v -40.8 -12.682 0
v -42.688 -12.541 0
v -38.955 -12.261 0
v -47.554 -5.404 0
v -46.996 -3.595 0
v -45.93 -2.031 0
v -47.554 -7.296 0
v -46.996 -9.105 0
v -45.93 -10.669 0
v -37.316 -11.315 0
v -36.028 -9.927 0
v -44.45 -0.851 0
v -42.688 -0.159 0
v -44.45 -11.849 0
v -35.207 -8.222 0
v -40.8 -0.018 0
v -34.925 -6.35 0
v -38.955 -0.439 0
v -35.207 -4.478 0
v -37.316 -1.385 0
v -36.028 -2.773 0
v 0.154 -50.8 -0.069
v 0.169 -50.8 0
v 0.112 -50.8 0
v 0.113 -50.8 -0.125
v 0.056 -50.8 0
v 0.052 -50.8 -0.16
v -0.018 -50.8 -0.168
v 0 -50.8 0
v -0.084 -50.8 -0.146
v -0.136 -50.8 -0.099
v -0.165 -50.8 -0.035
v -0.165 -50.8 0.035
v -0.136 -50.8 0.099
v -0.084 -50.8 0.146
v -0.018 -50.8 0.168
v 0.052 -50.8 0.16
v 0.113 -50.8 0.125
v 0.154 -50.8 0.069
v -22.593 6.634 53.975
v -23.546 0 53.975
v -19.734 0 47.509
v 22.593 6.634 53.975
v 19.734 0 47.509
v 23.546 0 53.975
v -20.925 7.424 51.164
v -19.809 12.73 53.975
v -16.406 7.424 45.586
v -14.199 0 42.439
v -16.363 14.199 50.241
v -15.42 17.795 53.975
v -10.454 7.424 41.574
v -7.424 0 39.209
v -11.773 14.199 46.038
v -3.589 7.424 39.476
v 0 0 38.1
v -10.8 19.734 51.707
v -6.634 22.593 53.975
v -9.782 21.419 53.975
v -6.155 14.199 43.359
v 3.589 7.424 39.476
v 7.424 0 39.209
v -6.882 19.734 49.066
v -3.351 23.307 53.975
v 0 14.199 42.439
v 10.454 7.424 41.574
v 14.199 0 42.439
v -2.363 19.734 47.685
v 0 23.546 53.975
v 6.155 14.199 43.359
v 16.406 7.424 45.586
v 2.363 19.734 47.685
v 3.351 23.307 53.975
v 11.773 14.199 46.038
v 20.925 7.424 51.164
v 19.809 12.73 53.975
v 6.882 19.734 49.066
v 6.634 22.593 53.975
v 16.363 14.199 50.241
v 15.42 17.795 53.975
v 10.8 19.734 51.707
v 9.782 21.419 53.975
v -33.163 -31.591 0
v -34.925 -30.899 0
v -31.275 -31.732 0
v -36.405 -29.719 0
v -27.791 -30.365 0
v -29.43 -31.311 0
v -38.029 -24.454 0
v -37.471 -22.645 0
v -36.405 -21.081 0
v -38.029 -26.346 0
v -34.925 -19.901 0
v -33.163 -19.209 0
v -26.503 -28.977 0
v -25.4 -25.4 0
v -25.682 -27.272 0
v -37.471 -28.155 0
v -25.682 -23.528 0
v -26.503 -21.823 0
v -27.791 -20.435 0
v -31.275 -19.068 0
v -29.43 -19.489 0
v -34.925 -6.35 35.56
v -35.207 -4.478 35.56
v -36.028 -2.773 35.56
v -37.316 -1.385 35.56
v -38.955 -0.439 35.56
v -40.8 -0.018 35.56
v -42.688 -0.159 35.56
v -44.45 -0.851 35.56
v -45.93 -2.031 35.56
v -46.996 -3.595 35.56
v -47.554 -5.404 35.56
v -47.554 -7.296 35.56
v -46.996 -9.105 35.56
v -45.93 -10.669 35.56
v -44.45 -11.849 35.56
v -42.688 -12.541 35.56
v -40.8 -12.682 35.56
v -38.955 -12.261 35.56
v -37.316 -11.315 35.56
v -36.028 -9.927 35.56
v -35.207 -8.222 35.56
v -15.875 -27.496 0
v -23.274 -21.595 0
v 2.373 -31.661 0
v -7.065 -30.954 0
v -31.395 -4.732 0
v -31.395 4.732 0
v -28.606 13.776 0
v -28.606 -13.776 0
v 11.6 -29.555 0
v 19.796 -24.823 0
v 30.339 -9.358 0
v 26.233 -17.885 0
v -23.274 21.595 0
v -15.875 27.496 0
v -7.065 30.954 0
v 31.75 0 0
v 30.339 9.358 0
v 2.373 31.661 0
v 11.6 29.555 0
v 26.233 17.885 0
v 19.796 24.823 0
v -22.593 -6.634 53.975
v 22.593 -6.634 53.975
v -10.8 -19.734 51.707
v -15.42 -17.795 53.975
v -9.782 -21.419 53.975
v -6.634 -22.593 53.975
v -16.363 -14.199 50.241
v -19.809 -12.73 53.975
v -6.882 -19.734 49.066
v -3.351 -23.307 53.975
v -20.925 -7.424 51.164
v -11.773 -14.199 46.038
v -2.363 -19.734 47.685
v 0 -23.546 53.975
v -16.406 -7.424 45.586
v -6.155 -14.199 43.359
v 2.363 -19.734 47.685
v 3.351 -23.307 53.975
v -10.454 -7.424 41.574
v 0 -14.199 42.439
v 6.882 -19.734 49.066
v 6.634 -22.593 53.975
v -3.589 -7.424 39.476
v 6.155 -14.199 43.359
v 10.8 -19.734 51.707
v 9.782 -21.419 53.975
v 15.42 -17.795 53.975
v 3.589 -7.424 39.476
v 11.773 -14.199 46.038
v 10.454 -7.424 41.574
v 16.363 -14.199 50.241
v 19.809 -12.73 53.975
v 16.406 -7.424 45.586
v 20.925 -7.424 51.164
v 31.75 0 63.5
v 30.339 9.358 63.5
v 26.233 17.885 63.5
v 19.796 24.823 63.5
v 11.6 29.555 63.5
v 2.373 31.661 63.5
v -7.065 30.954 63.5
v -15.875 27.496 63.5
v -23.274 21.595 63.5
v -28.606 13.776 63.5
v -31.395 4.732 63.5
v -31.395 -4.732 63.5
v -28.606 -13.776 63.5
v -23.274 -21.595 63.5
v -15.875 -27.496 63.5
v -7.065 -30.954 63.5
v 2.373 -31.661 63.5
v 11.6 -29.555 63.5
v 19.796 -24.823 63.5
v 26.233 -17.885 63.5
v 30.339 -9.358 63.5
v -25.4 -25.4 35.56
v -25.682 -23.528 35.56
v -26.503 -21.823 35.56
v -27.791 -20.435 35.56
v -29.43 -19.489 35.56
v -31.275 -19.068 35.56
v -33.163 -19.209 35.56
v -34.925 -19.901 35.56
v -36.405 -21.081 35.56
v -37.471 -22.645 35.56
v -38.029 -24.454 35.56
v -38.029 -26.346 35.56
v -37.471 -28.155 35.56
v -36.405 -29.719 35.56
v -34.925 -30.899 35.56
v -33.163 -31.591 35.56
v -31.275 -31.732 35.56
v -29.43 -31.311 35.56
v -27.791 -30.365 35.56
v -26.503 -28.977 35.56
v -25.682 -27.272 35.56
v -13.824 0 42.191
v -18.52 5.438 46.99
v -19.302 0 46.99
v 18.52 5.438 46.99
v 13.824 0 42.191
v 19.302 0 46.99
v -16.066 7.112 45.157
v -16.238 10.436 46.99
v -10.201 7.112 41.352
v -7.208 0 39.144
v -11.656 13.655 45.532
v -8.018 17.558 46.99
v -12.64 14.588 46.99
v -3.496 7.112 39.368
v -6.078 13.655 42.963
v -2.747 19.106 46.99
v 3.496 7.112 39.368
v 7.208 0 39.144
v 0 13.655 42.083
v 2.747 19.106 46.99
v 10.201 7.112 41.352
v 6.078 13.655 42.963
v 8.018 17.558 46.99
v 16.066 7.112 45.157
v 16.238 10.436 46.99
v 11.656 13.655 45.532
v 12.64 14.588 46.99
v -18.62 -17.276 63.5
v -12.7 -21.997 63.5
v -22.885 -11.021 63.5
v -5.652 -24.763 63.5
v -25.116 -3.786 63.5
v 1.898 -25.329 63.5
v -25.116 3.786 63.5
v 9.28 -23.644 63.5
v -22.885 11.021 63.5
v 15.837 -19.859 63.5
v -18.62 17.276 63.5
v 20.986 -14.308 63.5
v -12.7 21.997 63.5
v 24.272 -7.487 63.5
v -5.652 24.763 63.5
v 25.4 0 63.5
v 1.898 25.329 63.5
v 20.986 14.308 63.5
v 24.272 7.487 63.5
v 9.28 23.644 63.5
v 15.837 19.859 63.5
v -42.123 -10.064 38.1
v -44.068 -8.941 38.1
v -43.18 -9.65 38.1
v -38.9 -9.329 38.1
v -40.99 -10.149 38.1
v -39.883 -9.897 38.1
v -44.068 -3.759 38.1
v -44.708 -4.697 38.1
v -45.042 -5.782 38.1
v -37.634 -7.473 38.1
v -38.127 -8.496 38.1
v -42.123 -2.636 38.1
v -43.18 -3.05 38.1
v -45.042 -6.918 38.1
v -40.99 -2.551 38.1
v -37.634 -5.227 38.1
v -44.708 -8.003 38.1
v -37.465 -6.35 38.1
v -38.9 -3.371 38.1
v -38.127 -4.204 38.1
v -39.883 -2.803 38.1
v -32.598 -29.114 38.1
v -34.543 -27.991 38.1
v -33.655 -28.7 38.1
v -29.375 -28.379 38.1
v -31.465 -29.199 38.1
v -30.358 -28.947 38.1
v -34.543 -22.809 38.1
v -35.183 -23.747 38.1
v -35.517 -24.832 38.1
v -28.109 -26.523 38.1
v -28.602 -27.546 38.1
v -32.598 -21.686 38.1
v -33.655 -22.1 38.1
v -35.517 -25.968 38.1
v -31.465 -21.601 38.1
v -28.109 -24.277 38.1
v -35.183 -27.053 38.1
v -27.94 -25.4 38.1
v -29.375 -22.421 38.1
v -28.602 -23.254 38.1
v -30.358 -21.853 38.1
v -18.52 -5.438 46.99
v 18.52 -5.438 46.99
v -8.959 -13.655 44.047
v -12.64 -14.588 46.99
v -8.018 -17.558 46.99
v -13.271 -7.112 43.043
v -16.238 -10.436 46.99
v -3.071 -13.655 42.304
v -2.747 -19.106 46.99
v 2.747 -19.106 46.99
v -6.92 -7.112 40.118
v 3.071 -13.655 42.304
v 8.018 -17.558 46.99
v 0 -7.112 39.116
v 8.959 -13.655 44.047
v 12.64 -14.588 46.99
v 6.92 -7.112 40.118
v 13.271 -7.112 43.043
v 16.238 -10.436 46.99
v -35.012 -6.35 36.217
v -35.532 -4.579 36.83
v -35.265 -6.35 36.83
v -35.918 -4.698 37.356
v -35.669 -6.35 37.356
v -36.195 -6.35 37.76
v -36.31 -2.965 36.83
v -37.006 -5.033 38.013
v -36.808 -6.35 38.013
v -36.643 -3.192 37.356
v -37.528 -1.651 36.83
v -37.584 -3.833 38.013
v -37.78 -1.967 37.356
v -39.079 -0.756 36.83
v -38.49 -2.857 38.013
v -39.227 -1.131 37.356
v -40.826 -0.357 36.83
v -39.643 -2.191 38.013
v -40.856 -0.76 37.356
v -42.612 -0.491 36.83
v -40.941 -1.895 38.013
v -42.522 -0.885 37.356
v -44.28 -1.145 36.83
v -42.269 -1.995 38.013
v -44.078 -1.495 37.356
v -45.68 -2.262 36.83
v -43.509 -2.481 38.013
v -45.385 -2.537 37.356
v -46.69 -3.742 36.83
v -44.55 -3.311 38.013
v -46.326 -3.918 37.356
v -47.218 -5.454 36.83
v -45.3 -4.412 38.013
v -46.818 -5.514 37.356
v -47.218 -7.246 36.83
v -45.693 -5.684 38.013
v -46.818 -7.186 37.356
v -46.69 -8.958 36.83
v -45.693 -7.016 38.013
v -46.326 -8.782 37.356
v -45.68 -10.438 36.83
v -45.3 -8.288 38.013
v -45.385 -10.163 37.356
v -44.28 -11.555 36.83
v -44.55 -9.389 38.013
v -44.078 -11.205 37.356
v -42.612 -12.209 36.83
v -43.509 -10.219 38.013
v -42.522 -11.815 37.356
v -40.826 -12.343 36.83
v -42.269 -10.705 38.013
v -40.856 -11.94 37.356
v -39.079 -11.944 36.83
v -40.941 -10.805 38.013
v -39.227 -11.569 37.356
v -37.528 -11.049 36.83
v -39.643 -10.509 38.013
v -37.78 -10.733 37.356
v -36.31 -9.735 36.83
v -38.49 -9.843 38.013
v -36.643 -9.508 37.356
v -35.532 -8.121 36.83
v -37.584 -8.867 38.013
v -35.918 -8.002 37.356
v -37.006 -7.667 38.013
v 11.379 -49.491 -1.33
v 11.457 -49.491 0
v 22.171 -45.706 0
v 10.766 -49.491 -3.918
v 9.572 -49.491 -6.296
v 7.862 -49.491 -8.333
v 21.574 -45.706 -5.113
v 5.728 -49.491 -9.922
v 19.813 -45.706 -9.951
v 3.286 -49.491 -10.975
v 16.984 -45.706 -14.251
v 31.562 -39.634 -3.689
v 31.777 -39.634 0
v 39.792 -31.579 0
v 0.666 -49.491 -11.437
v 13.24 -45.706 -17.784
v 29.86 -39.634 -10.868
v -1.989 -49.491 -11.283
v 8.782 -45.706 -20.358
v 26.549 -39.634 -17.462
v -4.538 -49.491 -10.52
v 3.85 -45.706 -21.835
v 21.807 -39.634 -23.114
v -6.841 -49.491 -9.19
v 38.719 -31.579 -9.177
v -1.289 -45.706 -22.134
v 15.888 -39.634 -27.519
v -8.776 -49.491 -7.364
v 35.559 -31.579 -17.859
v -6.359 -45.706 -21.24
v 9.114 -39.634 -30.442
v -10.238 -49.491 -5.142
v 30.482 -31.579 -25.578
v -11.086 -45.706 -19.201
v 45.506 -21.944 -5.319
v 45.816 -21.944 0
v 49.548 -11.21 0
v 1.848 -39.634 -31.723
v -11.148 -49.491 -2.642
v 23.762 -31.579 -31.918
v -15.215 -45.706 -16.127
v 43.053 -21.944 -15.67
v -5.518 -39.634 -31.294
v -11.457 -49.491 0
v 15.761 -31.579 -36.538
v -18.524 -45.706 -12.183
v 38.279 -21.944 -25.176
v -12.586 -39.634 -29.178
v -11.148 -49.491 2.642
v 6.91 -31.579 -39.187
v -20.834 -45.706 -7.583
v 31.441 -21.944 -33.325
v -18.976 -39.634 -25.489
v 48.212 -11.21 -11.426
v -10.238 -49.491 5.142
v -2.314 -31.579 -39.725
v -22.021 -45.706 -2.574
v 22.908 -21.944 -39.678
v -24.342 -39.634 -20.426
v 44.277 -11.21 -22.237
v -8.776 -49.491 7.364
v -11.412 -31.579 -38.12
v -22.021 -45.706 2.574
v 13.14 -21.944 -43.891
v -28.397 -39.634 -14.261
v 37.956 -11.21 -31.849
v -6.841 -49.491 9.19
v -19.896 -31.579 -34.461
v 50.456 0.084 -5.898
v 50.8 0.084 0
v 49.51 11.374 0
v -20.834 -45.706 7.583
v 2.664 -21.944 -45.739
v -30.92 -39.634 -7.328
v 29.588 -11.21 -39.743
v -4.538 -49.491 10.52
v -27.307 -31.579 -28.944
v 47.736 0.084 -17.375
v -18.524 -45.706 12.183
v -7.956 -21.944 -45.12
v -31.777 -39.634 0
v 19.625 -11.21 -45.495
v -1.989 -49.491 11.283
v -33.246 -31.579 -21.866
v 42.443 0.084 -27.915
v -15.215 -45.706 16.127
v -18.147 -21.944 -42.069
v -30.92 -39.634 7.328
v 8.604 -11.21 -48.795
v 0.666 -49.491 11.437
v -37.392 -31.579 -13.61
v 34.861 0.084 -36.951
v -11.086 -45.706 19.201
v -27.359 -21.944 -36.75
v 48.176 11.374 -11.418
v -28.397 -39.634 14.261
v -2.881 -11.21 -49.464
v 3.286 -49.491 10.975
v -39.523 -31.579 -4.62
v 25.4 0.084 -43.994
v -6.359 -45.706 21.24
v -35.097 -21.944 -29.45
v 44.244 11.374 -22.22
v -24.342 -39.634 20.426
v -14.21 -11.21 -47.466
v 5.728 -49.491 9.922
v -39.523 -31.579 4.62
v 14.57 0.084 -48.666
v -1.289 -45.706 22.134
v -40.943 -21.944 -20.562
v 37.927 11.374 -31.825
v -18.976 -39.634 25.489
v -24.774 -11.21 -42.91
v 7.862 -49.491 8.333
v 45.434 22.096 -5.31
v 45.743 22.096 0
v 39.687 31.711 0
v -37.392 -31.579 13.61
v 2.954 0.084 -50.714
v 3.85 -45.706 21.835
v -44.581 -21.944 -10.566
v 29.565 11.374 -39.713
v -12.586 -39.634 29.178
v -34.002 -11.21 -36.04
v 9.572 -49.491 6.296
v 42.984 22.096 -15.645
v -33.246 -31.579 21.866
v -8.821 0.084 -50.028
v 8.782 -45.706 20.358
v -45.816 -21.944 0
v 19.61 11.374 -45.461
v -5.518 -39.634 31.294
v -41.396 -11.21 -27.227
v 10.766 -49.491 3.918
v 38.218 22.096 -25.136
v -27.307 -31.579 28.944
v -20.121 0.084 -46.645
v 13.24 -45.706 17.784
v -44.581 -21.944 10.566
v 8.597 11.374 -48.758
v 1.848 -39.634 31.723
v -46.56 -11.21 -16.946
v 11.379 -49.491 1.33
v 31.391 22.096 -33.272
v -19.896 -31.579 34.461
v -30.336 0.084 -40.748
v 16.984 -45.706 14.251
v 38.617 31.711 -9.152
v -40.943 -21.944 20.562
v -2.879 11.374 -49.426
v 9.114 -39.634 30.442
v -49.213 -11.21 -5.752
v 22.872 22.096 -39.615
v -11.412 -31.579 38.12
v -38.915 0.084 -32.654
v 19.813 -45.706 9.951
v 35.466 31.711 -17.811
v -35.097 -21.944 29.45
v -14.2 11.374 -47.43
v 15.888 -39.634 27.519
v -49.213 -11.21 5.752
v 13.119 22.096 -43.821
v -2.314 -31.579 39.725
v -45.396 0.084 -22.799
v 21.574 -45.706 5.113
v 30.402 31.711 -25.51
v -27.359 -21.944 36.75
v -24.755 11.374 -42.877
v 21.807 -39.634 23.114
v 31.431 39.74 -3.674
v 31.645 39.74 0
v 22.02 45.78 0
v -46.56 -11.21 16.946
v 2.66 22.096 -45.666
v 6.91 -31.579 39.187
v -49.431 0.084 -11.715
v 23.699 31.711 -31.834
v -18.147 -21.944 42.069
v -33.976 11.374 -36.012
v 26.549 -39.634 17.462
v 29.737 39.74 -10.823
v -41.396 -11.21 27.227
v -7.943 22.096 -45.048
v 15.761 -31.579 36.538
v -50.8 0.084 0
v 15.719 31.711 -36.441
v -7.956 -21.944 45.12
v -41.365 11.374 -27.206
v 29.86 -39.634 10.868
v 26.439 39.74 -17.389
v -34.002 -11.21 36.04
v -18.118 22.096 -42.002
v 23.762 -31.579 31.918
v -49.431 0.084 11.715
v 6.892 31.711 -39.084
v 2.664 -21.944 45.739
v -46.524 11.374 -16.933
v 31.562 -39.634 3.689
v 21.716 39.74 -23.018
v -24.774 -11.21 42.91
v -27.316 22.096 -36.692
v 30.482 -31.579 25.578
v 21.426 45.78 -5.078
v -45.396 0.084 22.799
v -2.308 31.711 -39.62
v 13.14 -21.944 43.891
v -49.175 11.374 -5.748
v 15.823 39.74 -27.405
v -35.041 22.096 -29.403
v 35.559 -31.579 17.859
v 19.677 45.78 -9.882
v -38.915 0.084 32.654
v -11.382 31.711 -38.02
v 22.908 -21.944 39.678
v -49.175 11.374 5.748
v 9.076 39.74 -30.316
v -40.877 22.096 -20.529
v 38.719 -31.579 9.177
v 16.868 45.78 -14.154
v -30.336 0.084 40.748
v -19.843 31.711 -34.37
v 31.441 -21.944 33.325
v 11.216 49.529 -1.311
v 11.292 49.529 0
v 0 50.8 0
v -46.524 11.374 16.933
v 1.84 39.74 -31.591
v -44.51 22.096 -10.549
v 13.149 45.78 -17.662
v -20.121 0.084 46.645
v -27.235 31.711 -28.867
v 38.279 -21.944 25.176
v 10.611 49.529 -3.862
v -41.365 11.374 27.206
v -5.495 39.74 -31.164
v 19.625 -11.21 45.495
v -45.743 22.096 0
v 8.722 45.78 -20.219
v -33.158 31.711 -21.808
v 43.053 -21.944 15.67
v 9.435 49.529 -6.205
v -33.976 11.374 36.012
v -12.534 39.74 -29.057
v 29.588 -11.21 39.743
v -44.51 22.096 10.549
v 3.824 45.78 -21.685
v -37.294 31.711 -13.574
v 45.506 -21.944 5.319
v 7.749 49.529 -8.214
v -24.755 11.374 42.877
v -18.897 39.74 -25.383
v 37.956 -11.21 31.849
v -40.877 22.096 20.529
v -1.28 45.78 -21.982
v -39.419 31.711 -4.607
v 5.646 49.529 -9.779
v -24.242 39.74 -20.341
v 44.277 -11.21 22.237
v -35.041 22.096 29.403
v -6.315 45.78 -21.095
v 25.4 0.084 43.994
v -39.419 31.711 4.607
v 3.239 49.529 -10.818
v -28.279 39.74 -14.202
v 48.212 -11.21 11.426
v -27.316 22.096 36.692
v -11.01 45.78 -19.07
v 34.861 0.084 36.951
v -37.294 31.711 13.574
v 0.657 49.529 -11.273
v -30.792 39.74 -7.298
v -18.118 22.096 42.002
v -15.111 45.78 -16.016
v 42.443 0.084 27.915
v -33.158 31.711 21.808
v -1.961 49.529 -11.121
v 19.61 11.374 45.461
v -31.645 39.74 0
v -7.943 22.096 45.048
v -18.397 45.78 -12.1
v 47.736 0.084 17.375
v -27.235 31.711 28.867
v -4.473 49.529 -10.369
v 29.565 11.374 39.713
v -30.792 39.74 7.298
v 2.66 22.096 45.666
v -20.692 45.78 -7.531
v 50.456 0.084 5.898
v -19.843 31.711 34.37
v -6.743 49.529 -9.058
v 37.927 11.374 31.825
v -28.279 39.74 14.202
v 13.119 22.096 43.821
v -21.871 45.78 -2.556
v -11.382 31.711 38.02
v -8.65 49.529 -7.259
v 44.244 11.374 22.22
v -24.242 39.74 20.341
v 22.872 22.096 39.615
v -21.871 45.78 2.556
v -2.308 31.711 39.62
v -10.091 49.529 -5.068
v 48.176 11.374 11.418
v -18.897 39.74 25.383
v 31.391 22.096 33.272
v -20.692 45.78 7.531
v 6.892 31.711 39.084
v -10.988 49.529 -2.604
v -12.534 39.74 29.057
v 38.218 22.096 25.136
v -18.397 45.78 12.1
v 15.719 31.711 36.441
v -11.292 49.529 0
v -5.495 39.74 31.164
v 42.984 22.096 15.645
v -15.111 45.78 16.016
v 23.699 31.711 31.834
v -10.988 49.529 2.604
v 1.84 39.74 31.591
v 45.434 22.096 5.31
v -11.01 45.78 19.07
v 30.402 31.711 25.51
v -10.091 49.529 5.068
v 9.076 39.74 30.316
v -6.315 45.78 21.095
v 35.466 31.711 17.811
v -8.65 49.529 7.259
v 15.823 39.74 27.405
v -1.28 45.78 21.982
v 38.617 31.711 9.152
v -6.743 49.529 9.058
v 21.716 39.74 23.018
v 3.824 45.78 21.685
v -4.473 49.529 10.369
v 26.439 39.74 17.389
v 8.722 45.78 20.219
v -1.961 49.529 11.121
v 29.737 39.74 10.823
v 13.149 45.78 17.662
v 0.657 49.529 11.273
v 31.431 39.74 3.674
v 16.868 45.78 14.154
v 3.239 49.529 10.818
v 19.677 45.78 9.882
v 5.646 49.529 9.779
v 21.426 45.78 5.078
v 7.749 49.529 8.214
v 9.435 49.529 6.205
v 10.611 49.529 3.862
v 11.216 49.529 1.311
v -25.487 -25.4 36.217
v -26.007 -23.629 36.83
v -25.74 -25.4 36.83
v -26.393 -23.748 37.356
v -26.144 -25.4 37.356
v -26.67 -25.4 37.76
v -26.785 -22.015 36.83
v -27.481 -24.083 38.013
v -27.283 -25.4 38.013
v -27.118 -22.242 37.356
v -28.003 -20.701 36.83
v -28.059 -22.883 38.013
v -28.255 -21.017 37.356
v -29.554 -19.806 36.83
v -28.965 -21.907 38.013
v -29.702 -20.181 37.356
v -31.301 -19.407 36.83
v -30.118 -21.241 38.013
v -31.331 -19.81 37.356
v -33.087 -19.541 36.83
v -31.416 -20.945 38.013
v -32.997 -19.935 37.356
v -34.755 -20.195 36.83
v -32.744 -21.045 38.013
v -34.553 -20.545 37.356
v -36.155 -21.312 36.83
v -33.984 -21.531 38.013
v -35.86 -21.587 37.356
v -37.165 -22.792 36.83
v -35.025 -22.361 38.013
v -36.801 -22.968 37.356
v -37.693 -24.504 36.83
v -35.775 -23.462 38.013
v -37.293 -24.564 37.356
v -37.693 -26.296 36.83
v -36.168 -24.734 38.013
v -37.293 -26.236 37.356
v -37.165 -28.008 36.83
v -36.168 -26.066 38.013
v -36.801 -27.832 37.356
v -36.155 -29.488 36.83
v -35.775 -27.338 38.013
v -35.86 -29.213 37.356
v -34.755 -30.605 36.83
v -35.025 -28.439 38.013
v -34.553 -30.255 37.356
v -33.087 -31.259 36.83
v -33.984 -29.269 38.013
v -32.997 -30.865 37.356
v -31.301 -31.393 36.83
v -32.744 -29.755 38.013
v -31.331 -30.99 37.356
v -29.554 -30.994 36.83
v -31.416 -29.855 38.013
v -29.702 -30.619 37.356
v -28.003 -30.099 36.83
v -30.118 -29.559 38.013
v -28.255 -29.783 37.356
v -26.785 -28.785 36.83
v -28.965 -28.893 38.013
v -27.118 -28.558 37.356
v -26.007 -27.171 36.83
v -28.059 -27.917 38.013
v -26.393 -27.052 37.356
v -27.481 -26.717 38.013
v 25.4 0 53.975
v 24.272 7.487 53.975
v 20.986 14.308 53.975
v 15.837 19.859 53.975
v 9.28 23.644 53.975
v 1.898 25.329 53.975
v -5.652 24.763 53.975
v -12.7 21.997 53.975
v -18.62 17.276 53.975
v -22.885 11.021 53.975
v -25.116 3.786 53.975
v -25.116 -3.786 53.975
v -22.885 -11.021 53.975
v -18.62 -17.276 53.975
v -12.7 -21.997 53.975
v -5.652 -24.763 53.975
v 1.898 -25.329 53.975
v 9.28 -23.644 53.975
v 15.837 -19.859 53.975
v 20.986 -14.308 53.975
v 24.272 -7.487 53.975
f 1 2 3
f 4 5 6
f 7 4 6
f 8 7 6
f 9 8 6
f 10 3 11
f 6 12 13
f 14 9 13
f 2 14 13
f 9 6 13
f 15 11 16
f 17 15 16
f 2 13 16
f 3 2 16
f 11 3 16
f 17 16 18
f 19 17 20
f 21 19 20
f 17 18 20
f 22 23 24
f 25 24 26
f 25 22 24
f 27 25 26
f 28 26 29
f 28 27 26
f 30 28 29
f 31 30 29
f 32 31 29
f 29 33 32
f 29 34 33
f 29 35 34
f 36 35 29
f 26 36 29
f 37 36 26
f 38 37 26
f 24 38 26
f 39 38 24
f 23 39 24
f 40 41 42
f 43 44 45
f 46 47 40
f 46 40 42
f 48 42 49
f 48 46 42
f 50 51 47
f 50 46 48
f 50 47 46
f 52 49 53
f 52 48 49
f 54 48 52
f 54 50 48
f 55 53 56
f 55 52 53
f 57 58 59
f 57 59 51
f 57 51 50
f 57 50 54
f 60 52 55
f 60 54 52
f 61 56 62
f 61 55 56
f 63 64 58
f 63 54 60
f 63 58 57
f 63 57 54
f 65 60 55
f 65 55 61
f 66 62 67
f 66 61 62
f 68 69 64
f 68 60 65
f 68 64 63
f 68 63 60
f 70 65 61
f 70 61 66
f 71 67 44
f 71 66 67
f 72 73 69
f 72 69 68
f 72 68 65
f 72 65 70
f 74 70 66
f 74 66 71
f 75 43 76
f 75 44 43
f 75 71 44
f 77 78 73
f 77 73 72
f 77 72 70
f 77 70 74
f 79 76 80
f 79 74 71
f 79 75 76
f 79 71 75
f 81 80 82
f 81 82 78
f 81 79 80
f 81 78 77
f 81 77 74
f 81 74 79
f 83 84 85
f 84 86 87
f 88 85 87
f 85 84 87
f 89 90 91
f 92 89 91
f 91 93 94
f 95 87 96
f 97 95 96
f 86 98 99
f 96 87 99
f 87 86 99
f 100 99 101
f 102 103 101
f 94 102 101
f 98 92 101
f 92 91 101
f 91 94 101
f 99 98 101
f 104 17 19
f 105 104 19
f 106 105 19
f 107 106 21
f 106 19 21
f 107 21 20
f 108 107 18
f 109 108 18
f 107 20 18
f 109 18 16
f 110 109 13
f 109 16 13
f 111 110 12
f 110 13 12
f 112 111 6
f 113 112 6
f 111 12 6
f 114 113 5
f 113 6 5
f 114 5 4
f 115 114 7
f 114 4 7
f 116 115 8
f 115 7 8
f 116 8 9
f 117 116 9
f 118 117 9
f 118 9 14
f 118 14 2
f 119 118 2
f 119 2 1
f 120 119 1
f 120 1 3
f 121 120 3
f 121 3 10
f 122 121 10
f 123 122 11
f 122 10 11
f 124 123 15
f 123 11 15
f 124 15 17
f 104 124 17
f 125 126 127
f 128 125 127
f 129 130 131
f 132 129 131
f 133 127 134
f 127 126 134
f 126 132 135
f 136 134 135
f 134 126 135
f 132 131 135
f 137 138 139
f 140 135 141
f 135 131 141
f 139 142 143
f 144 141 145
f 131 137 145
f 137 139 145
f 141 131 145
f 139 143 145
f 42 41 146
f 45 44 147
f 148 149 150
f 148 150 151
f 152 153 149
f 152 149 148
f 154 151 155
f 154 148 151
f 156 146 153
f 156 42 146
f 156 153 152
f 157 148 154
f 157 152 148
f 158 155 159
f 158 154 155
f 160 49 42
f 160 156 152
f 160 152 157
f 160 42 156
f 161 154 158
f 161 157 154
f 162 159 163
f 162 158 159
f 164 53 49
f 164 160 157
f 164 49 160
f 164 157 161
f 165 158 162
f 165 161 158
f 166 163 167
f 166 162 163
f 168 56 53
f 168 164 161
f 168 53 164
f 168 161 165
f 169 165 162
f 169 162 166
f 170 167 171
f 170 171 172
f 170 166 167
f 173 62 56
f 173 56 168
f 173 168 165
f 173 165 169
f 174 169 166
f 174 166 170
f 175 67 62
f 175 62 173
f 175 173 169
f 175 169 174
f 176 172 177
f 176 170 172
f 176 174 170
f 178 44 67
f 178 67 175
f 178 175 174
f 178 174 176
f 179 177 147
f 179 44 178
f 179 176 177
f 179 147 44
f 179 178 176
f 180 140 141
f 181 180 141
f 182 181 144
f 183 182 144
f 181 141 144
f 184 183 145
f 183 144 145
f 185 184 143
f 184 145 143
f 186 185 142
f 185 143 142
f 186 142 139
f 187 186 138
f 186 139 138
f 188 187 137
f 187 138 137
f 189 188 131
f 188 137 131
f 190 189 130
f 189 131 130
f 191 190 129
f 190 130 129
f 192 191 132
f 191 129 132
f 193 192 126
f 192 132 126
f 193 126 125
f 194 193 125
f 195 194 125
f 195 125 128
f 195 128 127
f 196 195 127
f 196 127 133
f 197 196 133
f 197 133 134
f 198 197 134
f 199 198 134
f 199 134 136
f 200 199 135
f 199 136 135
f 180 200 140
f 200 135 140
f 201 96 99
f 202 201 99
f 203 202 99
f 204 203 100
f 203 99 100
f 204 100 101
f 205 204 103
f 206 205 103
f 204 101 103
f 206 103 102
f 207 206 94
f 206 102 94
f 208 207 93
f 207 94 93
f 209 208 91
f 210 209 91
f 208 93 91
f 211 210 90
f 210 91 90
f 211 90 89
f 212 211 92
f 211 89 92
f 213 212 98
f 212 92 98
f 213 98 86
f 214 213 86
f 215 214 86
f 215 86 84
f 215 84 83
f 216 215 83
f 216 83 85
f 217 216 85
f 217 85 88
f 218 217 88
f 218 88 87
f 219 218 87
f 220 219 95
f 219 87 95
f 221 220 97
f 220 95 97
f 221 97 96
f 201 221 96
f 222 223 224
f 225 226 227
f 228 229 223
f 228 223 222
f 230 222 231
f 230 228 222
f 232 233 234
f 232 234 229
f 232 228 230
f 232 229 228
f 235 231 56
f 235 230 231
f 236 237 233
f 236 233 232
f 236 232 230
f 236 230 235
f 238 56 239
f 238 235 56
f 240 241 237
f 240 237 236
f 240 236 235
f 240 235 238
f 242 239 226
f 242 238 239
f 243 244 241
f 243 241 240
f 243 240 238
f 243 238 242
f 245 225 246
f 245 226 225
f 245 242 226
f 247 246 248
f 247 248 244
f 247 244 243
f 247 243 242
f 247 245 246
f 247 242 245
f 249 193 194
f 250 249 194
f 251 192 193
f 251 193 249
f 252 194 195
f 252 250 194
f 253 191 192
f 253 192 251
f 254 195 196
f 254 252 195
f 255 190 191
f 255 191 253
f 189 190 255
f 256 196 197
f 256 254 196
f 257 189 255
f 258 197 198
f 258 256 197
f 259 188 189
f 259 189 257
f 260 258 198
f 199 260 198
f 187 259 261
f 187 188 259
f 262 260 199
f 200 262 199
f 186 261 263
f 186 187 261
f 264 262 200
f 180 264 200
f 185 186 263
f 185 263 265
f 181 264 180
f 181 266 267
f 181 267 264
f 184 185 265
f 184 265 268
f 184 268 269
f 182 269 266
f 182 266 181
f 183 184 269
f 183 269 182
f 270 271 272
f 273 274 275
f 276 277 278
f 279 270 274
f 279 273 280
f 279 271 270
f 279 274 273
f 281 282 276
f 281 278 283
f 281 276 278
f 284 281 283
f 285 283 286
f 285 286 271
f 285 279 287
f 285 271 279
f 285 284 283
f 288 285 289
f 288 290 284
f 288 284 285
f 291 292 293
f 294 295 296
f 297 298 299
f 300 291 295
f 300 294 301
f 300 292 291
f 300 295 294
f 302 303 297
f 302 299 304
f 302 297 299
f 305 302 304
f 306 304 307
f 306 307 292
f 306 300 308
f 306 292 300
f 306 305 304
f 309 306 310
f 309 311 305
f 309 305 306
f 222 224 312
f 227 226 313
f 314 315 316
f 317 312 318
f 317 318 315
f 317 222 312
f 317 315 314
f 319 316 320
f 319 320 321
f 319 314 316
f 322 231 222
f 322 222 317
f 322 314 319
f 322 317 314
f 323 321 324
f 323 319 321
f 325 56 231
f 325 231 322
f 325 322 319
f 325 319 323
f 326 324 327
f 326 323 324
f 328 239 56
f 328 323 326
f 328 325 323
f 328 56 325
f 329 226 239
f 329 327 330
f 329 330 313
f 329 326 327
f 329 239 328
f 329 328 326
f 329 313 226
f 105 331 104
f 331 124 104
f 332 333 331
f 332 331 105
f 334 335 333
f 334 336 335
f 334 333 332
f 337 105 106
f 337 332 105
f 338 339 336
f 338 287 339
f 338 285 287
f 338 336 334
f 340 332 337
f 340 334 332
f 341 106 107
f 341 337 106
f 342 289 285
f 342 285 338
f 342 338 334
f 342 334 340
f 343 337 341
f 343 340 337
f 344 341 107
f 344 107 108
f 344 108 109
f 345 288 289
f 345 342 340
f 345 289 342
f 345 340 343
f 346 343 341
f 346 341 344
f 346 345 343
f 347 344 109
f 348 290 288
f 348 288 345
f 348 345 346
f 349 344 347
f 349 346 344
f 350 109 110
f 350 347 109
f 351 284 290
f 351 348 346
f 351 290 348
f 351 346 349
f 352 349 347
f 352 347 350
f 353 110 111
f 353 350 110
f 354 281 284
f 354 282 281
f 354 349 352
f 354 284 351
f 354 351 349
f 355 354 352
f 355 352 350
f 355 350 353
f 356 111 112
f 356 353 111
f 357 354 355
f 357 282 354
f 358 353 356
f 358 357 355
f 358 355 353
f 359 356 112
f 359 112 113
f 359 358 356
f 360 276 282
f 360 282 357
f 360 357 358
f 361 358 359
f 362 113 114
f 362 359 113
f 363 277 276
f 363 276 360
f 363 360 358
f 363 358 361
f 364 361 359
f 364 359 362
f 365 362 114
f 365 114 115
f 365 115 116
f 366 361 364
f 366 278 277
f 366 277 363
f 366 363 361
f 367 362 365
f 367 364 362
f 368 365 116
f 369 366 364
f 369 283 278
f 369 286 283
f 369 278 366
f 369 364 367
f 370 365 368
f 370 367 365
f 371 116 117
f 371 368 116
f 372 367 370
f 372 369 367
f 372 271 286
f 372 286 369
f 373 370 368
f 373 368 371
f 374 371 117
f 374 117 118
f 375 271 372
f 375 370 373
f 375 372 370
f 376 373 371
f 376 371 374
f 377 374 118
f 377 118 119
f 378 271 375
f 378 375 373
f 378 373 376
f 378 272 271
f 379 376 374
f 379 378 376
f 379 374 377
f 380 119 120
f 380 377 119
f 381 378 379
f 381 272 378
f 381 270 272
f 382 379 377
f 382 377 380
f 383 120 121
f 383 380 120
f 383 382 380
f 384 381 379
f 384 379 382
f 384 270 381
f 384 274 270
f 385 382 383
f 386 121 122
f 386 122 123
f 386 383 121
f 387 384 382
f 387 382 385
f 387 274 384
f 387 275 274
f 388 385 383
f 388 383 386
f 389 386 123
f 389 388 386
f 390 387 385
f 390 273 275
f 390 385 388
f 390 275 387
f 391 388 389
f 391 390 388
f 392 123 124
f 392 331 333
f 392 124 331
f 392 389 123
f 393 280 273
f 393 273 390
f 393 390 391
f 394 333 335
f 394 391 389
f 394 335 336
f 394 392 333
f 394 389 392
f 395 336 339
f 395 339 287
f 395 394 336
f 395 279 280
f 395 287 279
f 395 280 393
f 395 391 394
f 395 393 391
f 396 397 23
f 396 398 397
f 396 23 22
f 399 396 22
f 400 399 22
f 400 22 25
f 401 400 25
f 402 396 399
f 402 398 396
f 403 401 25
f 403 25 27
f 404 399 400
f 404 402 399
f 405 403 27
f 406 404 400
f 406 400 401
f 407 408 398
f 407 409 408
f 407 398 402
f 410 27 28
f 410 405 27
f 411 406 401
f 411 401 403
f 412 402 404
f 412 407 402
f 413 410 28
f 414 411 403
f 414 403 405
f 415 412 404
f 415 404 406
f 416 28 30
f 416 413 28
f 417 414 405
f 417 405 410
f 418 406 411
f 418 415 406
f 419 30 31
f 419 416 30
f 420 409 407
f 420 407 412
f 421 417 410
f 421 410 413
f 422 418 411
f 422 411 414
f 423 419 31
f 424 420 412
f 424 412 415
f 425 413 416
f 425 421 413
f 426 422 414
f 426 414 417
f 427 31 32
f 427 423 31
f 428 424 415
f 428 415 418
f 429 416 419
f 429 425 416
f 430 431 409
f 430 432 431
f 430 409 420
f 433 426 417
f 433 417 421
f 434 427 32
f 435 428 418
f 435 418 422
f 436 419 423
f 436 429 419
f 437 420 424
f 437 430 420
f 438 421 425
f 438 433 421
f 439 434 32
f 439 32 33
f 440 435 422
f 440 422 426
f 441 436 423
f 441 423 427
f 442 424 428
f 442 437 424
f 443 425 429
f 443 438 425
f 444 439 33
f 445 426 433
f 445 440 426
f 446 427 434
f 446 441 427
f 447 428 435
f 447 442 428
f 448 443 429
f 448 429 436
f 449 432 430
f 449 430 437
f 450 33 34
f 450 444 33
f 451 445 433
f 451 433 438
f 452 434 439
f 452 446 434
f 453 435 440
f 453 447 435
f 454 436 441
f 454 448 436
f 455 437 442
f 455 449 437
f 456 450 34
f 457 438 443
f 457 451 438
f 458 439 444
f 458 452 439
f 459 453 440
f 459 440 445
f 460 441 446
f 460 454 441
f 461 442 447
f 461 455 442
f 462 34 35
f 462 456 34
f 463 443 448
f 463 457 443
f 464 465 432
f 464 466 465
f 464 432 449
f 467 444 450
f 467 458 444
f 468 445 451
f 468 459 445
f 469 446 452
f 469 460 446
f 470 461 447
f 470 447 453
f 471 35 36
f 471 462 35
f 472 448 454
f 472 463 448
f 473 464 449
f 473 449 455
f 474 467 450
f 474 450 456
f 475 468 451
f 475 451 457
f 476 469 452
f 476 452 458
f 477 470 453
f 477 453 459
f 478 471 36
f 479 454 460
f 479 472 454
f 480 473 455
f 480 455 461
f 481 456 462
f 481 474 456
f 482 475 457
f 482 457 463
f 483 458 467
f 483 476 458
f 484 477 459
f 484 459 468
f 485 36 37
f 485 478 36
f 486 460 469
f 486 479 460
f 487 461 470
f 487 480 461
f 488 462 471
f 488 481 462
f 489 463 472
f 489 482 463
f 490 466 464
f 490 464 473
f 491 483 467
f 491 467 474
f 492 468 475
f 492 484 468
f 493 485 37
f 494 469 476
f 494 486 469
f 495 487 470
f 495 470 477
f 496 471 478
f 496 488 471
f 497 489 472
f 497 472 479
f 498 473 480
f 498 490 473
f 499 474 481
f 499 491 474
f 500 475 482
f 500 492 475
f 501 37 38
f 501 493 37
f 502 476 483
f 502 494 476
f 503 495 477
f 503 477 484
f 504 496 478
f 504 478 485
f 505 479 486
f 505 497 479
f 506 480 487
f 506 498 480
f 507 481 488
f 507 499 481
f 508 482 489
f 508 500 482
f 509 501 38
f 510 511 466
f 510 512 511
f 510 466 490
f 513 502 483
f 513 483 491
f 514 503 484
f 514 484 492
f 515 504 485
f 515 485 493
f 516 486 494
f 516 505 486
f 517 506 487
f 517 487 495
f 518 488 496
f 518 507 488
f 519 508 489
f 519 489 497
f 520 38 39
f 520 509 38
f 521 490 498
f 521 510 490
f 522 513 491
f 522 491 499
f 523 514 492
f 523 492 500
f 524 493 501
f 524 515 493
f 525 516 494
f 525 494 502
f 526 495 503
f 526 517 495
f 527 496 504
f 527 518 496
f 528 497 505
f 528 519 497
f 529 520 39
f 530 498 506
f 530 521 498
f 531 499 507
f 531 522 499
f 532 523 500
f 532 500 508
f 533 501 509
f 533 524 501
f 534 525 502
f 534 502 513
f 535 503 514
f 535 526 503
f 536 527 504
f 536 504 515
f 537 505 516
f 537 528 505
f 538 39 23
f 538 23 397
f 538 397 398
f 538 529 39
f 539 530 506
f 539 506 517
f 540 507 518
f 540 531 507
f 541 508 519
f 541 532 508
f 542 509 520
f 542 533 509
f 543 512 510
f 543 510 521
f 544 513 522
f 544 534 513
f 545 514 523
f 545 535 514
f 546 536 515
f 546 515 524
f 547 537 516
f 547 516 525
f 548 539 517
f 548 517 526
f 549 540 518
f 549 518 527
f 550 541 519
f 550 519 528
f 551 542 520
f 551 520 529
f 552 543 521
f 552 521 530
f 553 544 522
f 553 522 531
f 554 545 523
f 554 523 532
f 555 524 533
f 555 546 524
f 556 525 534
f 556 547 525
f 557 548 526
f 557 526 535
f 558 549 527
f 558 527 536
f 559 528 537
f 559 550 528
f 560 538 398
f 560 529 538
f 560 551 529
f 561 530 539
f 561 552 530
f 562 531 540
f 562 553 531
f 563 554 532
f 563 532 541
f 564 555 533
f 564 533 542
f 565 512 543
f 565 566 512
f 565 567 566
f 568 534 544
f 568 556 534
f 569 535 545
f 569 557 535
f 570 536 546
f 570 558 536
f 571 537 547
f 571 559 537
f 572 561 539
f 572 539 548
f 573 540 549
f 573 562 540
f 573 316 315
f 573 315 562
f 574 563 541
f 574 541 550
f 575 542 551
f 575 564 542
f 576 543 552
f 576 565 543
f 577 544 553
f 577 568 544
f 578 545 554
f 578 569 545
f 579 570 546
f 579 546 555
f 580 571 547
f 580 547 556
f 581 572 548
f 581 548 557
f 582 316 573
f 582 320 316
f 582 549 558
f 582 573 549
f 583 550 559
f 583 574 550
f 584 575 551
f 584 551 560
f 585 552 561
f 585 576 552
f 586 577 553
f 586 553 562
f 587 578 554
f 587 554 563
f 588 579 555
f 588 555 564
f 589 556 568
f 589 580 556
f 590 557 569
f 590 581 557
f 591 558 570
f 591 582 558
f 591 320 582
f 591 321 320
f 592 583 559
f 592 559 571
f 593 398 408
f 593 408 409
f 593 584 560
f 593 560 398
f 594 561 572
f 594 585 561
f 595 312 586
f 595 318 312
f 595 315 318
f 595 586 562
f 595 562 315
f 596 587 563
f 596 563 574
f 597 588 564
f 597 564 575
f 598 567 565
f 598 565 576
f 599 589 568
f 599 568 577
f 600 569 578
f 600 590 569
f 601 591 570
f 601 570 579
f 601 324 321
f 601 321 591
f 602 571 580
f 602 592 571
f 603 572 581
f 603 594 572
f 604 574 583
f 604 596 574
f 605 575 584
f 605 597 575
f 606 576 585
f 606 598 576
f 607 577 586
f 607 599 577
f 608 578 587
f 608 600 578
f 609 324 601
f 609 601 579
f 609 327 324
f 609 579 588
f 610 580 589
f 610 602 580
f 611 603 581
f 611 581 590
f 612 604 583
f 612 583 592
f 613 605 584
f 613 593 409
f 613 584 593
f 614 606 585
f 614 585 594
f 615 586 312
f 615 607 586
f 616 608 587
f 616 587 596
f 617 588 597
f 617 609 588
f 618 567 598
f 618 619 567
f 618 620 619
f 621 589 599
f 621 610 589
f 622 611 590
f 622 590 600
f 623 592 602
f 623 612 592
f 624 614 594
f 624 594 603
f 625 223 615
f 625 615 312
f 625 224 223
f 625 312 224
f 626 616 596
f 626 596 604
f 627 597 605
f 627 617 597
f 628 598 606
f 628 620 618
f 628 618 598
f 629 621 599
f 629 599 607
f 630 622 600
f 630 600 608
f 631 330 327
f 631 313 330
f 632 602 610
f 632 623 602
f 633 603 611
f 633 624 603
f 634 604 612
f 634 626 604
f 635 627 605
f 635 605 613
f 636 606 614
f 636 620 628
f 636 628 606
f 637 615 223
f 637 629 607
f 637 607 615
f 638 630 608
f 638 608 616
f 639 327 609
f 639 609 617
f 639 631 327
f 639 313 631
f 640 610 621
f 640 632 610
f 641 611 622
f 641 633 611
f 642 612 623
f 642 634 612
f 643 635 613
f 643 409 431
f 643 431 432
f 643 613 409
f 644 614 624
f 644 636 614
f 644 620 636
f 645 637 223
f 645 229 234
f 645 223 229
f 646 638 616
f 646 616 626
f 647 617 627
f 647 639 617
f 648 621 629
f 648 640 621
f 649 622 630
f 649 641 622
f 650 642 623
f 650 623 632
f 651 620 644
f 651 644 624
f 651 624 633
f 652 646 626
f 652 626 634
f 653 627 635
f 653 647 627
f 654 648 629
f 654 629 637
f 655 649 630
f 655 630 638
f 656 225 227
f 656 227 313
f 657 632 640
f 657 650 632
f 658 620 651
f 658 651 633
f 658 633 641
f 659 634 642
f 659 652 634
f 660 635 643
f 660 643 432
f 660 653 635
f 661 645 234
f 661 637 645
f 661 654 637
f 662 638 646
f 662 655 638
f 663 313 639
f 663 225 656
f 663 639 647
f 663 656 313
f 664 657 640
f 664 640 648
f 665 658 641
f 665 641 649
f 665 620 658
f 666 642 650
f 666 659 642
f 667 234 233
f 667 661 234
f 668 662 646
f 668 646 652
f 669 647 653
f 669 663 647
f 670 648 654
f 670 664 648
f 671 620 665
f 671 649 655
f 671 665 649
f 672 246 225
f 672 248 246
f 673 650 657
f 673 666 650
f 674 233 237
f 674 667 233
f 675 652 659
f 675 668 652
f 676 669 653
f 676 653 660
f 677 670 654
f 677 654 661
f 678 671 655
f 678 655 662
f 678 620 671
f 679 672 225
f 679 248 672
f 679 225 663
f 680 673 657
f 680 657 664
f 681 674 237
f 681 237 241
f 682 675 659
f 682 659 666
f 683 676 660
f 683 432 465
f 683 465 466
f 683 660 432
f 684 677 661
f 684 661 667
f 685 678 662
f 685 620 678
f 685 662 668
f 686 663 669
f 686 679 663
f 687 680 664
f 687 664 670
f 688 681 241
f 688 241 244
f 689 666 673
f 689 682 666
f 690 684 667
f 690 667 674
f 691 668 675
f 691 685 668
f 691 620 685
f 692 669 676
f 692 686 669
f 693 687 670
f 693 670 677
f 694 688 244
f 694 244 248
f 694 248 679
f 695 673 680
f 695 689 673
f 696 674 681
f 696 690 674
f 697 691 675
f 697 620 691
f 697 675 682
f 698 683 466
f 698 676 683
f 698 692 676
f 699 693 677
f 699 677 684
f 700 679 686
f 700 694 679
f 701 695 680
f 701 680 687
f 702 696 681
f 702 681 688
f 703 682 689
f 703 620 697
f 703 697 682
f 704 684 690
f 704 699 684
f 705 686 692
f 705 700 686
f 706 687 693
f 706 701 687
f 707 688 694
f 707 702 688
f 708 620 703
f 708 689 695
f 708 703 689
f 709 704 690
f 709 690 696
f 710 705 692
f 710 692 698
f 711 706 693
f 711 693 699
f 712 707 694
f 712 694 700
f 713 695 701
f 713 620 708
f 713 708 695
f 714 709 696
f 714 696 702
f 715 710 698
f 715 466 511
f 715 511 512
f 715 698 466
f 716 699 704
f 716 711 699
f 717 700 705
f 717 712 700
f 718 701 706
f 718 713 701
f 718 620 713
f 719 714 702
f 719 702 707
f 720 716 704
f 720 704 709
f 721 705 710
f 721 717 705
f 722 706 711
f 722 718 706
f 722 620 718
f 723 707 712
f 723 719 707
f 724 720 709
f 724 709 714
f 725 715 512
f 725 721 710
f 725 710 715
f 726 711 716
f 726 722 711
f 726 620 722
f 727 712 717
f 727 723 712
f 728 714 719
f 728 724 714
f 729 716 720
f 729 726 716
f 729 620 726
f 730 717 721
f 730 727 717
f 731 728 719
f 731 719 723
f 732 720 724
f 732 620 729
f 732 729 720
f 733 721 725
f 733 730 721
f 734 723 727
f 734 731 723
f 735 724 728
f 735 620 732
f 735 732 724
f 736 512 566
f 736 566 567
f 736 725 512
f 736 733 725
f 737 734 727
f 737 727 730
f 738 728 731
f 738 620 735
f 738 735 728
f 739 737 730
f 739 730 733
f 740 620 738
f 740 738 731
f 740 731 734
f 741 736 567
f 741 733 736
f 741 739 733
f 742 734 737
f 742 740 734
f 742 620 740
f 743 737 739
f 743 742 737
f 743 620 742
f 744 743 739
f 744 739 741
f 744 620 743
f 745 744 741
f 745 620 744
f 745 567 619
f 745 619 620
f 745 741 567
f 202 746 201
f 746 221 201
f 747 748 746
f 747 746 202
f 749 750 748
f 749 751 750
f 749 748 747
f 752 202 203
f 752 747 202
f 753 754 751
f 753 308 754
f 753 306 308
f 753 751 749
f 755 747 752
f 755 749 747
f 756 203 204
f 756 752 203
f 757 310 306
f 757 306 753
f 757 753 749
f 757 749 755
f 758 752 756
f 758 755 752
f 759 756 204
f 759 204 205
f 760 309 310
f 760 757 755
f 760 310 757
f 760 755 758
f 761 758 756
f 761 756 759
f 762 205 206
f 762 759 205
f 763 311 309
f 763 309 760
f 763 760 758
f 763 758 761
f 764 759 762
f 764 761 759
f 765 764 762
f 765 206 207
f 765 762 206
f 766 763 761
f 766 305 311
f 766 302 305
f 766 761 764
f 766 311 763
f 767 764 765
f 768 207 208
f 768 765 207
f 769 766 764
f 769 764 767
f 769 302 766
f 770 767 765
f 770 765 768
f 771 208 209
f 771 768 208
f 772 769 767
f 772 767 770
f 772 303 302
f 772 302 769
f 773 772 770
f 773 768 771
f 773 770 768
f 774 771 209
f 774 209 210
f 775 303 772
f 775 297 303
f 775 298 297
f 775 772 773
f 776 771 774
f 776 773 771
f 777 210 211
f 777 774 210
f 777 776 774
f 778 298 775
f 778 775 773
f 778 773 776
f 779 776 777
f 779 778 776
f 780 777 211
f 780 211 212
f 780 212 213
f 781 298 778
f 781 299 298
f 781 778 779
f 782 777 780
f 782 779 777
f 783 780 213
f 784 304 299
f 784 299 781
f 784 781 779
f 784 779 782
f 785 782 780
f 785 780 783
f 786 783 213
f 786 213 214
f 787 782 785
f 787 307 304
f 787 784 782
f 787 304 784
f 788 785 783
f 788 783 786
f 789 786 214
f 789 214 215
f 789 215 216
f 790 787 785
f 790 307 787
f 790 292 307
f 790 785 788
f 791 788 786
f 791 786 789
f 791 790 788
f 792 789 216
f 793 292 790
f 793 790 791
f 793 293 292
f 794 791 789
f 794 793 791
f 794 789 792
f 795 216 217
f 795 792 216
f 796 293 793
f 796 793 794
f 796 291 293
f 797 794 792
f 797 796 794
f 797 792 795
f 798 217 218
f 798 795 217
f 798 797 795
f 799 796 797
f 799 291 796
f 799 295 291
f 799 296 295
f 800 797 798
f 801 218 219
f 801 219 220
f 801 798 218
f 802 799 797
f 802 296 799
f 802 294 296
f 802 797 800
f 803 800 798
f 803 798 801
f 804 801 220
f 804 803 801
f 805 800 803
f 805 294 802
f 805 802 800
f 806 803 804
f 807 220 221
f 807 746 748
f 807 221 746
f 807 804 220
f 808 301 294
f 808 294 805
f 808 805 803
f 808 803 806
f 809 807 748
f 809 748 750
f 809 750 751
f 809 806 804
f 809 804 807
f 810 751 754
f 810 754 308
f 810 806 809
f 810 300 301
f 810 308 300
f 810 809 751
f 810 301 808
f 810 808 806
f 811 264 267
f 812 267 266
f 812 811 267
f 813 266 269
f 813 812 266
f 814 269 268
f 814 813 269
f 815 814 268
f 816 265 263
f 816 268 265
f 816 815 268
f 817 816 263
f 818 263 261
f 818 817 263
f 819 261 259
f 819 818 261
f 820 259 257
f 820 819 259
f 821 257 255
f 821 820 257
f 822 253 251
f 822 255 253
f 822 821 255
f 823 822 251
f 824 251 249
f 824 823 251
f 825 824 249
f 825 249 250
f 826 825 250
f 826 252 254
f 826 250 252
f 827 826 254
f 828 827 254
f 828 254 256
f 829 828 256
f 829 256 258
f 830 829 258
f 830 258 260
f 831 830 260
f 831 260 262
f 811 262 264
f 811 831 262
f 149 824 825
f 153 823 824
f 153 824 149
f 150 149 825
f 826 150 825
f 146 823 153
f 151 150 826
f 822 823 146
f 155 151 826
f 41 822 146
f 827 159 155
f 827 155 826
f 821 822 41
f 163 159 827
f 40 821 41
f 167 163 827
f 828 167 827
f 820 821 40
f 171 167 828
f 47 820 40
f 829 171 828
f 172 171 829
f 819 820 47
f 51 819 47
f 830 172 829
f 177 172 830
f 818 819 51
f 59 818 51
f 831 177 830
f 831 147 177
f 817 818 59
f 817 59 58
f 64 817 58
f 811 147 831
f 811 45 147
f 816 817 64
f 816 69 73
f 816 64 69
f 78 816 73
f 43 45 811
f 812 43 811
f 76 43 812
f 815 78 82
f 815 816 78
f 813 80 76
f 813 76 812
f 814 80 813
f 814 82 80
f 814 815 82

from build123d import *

# Parameters (mm, degrees)
F2_R     = 31.75
F2_R_2   = 25.4
F3_DEPTH = 63.5
F4_DEPTH = 53.975
F2_R_3   = 6.35
F7_DEPTH = 38.1
F8_DEPTH = 38.1
F9_R     = 2.54
F9_2_R   = 2.54


with BuildPart() as f1:
    # F0 (on Top) → F1 (revolve)
    with BuildSketch(Plane.XY):
        with BuildLine():
            Line((0, 50.8), (0, -50.8))
            ThreePointArc((0, -50.8), (0.0842871743, -50.7999300755), (0.1685741165, -50.7997203021))
            ThreePointArc((0.1685741165, -50.7997203021), (50.7999300755, 0.0842871743), (0, 50.8))
        make_face()
    revolve(axis=Axis((0, 0, 0), (0, 1, 0)))


with BuildPart() as f3:
    # F2 (on Top) → F3 (new body)
    with BuildSketch(Plane.XY):
        Circle(F2_R)
        Circle(F2_R_2, mode=Mode.SUBTRACT)
    extrude(amount=F3_DEPTH)

    # F2 (on Top) → F4 (join)
    with BuildSketch(Plane.XY):
        Circle(F2_R_2)
    extrude(amount=F4_DEPTH)


with BuildPart() as f6_tool:
    # F5 (on face) → F6 (revolve)
    with BuildSketch(Plane.XY.offset(63.5)):
        with BuildLine():
            ThreePointArc((25.4, 0), (17.9605122421, 17.9605122421), (0, 25.4))
            Line((0, 25.4), (0, -25.4))
            ThreePointArc((0, -25.4), (17.9605122421, -17.9605122421), (25.4, 0))
        make_face()
    revolve(axis=Axis((0, 0, 63.5), (0, -1, 0)))


with BuildPart() as f1_1:
    add(f1.part)

    # F6: cut by f6_tool
    add(f6_tool.part, mode=Mode.SUBTRACT)


with BuildPart() as f3_1:
    add(f3.part)

    # F6: cut by f6_tool
    add(f6_tool.part, mode=Mode.SUBTRACT)


with BuildPart() as f7:
    # F2 (on Top) → F7 (new body)
    with BuildSketch(Plane.XY):
        with Locations((-41.275, -6.35)):
            Circle(F2_R_3)
    extrude(amount=F7_DEPTH)

    # F9
    f9_edges = [f7.edges().sort_by_distance(p)[0] for p in [
        (-47.625, -6.35, 38.1),
    ]]
    fillet(f9_edges, radius=F9_R)


with BuildPart() as f8:
    # F2 (on Top) → F8 (new body)
    with BuildSketch(Plane.XY):
        with Locations((-31.75, -25.4)):
            Circle(F2_R_3)
    extrude(amount=F8_DEPTH)

    # F9#2
    f9_2_edges = [f8.edges().sort_by_distance(p)[0] for p in [
        (-38.1, -25.4, 38.1),
    ]]
    fillet(f9_2_edges, radius=F9_2_R)


solid = Compound([f1_1.part, f3_1.part, f7.part, f8.part])
